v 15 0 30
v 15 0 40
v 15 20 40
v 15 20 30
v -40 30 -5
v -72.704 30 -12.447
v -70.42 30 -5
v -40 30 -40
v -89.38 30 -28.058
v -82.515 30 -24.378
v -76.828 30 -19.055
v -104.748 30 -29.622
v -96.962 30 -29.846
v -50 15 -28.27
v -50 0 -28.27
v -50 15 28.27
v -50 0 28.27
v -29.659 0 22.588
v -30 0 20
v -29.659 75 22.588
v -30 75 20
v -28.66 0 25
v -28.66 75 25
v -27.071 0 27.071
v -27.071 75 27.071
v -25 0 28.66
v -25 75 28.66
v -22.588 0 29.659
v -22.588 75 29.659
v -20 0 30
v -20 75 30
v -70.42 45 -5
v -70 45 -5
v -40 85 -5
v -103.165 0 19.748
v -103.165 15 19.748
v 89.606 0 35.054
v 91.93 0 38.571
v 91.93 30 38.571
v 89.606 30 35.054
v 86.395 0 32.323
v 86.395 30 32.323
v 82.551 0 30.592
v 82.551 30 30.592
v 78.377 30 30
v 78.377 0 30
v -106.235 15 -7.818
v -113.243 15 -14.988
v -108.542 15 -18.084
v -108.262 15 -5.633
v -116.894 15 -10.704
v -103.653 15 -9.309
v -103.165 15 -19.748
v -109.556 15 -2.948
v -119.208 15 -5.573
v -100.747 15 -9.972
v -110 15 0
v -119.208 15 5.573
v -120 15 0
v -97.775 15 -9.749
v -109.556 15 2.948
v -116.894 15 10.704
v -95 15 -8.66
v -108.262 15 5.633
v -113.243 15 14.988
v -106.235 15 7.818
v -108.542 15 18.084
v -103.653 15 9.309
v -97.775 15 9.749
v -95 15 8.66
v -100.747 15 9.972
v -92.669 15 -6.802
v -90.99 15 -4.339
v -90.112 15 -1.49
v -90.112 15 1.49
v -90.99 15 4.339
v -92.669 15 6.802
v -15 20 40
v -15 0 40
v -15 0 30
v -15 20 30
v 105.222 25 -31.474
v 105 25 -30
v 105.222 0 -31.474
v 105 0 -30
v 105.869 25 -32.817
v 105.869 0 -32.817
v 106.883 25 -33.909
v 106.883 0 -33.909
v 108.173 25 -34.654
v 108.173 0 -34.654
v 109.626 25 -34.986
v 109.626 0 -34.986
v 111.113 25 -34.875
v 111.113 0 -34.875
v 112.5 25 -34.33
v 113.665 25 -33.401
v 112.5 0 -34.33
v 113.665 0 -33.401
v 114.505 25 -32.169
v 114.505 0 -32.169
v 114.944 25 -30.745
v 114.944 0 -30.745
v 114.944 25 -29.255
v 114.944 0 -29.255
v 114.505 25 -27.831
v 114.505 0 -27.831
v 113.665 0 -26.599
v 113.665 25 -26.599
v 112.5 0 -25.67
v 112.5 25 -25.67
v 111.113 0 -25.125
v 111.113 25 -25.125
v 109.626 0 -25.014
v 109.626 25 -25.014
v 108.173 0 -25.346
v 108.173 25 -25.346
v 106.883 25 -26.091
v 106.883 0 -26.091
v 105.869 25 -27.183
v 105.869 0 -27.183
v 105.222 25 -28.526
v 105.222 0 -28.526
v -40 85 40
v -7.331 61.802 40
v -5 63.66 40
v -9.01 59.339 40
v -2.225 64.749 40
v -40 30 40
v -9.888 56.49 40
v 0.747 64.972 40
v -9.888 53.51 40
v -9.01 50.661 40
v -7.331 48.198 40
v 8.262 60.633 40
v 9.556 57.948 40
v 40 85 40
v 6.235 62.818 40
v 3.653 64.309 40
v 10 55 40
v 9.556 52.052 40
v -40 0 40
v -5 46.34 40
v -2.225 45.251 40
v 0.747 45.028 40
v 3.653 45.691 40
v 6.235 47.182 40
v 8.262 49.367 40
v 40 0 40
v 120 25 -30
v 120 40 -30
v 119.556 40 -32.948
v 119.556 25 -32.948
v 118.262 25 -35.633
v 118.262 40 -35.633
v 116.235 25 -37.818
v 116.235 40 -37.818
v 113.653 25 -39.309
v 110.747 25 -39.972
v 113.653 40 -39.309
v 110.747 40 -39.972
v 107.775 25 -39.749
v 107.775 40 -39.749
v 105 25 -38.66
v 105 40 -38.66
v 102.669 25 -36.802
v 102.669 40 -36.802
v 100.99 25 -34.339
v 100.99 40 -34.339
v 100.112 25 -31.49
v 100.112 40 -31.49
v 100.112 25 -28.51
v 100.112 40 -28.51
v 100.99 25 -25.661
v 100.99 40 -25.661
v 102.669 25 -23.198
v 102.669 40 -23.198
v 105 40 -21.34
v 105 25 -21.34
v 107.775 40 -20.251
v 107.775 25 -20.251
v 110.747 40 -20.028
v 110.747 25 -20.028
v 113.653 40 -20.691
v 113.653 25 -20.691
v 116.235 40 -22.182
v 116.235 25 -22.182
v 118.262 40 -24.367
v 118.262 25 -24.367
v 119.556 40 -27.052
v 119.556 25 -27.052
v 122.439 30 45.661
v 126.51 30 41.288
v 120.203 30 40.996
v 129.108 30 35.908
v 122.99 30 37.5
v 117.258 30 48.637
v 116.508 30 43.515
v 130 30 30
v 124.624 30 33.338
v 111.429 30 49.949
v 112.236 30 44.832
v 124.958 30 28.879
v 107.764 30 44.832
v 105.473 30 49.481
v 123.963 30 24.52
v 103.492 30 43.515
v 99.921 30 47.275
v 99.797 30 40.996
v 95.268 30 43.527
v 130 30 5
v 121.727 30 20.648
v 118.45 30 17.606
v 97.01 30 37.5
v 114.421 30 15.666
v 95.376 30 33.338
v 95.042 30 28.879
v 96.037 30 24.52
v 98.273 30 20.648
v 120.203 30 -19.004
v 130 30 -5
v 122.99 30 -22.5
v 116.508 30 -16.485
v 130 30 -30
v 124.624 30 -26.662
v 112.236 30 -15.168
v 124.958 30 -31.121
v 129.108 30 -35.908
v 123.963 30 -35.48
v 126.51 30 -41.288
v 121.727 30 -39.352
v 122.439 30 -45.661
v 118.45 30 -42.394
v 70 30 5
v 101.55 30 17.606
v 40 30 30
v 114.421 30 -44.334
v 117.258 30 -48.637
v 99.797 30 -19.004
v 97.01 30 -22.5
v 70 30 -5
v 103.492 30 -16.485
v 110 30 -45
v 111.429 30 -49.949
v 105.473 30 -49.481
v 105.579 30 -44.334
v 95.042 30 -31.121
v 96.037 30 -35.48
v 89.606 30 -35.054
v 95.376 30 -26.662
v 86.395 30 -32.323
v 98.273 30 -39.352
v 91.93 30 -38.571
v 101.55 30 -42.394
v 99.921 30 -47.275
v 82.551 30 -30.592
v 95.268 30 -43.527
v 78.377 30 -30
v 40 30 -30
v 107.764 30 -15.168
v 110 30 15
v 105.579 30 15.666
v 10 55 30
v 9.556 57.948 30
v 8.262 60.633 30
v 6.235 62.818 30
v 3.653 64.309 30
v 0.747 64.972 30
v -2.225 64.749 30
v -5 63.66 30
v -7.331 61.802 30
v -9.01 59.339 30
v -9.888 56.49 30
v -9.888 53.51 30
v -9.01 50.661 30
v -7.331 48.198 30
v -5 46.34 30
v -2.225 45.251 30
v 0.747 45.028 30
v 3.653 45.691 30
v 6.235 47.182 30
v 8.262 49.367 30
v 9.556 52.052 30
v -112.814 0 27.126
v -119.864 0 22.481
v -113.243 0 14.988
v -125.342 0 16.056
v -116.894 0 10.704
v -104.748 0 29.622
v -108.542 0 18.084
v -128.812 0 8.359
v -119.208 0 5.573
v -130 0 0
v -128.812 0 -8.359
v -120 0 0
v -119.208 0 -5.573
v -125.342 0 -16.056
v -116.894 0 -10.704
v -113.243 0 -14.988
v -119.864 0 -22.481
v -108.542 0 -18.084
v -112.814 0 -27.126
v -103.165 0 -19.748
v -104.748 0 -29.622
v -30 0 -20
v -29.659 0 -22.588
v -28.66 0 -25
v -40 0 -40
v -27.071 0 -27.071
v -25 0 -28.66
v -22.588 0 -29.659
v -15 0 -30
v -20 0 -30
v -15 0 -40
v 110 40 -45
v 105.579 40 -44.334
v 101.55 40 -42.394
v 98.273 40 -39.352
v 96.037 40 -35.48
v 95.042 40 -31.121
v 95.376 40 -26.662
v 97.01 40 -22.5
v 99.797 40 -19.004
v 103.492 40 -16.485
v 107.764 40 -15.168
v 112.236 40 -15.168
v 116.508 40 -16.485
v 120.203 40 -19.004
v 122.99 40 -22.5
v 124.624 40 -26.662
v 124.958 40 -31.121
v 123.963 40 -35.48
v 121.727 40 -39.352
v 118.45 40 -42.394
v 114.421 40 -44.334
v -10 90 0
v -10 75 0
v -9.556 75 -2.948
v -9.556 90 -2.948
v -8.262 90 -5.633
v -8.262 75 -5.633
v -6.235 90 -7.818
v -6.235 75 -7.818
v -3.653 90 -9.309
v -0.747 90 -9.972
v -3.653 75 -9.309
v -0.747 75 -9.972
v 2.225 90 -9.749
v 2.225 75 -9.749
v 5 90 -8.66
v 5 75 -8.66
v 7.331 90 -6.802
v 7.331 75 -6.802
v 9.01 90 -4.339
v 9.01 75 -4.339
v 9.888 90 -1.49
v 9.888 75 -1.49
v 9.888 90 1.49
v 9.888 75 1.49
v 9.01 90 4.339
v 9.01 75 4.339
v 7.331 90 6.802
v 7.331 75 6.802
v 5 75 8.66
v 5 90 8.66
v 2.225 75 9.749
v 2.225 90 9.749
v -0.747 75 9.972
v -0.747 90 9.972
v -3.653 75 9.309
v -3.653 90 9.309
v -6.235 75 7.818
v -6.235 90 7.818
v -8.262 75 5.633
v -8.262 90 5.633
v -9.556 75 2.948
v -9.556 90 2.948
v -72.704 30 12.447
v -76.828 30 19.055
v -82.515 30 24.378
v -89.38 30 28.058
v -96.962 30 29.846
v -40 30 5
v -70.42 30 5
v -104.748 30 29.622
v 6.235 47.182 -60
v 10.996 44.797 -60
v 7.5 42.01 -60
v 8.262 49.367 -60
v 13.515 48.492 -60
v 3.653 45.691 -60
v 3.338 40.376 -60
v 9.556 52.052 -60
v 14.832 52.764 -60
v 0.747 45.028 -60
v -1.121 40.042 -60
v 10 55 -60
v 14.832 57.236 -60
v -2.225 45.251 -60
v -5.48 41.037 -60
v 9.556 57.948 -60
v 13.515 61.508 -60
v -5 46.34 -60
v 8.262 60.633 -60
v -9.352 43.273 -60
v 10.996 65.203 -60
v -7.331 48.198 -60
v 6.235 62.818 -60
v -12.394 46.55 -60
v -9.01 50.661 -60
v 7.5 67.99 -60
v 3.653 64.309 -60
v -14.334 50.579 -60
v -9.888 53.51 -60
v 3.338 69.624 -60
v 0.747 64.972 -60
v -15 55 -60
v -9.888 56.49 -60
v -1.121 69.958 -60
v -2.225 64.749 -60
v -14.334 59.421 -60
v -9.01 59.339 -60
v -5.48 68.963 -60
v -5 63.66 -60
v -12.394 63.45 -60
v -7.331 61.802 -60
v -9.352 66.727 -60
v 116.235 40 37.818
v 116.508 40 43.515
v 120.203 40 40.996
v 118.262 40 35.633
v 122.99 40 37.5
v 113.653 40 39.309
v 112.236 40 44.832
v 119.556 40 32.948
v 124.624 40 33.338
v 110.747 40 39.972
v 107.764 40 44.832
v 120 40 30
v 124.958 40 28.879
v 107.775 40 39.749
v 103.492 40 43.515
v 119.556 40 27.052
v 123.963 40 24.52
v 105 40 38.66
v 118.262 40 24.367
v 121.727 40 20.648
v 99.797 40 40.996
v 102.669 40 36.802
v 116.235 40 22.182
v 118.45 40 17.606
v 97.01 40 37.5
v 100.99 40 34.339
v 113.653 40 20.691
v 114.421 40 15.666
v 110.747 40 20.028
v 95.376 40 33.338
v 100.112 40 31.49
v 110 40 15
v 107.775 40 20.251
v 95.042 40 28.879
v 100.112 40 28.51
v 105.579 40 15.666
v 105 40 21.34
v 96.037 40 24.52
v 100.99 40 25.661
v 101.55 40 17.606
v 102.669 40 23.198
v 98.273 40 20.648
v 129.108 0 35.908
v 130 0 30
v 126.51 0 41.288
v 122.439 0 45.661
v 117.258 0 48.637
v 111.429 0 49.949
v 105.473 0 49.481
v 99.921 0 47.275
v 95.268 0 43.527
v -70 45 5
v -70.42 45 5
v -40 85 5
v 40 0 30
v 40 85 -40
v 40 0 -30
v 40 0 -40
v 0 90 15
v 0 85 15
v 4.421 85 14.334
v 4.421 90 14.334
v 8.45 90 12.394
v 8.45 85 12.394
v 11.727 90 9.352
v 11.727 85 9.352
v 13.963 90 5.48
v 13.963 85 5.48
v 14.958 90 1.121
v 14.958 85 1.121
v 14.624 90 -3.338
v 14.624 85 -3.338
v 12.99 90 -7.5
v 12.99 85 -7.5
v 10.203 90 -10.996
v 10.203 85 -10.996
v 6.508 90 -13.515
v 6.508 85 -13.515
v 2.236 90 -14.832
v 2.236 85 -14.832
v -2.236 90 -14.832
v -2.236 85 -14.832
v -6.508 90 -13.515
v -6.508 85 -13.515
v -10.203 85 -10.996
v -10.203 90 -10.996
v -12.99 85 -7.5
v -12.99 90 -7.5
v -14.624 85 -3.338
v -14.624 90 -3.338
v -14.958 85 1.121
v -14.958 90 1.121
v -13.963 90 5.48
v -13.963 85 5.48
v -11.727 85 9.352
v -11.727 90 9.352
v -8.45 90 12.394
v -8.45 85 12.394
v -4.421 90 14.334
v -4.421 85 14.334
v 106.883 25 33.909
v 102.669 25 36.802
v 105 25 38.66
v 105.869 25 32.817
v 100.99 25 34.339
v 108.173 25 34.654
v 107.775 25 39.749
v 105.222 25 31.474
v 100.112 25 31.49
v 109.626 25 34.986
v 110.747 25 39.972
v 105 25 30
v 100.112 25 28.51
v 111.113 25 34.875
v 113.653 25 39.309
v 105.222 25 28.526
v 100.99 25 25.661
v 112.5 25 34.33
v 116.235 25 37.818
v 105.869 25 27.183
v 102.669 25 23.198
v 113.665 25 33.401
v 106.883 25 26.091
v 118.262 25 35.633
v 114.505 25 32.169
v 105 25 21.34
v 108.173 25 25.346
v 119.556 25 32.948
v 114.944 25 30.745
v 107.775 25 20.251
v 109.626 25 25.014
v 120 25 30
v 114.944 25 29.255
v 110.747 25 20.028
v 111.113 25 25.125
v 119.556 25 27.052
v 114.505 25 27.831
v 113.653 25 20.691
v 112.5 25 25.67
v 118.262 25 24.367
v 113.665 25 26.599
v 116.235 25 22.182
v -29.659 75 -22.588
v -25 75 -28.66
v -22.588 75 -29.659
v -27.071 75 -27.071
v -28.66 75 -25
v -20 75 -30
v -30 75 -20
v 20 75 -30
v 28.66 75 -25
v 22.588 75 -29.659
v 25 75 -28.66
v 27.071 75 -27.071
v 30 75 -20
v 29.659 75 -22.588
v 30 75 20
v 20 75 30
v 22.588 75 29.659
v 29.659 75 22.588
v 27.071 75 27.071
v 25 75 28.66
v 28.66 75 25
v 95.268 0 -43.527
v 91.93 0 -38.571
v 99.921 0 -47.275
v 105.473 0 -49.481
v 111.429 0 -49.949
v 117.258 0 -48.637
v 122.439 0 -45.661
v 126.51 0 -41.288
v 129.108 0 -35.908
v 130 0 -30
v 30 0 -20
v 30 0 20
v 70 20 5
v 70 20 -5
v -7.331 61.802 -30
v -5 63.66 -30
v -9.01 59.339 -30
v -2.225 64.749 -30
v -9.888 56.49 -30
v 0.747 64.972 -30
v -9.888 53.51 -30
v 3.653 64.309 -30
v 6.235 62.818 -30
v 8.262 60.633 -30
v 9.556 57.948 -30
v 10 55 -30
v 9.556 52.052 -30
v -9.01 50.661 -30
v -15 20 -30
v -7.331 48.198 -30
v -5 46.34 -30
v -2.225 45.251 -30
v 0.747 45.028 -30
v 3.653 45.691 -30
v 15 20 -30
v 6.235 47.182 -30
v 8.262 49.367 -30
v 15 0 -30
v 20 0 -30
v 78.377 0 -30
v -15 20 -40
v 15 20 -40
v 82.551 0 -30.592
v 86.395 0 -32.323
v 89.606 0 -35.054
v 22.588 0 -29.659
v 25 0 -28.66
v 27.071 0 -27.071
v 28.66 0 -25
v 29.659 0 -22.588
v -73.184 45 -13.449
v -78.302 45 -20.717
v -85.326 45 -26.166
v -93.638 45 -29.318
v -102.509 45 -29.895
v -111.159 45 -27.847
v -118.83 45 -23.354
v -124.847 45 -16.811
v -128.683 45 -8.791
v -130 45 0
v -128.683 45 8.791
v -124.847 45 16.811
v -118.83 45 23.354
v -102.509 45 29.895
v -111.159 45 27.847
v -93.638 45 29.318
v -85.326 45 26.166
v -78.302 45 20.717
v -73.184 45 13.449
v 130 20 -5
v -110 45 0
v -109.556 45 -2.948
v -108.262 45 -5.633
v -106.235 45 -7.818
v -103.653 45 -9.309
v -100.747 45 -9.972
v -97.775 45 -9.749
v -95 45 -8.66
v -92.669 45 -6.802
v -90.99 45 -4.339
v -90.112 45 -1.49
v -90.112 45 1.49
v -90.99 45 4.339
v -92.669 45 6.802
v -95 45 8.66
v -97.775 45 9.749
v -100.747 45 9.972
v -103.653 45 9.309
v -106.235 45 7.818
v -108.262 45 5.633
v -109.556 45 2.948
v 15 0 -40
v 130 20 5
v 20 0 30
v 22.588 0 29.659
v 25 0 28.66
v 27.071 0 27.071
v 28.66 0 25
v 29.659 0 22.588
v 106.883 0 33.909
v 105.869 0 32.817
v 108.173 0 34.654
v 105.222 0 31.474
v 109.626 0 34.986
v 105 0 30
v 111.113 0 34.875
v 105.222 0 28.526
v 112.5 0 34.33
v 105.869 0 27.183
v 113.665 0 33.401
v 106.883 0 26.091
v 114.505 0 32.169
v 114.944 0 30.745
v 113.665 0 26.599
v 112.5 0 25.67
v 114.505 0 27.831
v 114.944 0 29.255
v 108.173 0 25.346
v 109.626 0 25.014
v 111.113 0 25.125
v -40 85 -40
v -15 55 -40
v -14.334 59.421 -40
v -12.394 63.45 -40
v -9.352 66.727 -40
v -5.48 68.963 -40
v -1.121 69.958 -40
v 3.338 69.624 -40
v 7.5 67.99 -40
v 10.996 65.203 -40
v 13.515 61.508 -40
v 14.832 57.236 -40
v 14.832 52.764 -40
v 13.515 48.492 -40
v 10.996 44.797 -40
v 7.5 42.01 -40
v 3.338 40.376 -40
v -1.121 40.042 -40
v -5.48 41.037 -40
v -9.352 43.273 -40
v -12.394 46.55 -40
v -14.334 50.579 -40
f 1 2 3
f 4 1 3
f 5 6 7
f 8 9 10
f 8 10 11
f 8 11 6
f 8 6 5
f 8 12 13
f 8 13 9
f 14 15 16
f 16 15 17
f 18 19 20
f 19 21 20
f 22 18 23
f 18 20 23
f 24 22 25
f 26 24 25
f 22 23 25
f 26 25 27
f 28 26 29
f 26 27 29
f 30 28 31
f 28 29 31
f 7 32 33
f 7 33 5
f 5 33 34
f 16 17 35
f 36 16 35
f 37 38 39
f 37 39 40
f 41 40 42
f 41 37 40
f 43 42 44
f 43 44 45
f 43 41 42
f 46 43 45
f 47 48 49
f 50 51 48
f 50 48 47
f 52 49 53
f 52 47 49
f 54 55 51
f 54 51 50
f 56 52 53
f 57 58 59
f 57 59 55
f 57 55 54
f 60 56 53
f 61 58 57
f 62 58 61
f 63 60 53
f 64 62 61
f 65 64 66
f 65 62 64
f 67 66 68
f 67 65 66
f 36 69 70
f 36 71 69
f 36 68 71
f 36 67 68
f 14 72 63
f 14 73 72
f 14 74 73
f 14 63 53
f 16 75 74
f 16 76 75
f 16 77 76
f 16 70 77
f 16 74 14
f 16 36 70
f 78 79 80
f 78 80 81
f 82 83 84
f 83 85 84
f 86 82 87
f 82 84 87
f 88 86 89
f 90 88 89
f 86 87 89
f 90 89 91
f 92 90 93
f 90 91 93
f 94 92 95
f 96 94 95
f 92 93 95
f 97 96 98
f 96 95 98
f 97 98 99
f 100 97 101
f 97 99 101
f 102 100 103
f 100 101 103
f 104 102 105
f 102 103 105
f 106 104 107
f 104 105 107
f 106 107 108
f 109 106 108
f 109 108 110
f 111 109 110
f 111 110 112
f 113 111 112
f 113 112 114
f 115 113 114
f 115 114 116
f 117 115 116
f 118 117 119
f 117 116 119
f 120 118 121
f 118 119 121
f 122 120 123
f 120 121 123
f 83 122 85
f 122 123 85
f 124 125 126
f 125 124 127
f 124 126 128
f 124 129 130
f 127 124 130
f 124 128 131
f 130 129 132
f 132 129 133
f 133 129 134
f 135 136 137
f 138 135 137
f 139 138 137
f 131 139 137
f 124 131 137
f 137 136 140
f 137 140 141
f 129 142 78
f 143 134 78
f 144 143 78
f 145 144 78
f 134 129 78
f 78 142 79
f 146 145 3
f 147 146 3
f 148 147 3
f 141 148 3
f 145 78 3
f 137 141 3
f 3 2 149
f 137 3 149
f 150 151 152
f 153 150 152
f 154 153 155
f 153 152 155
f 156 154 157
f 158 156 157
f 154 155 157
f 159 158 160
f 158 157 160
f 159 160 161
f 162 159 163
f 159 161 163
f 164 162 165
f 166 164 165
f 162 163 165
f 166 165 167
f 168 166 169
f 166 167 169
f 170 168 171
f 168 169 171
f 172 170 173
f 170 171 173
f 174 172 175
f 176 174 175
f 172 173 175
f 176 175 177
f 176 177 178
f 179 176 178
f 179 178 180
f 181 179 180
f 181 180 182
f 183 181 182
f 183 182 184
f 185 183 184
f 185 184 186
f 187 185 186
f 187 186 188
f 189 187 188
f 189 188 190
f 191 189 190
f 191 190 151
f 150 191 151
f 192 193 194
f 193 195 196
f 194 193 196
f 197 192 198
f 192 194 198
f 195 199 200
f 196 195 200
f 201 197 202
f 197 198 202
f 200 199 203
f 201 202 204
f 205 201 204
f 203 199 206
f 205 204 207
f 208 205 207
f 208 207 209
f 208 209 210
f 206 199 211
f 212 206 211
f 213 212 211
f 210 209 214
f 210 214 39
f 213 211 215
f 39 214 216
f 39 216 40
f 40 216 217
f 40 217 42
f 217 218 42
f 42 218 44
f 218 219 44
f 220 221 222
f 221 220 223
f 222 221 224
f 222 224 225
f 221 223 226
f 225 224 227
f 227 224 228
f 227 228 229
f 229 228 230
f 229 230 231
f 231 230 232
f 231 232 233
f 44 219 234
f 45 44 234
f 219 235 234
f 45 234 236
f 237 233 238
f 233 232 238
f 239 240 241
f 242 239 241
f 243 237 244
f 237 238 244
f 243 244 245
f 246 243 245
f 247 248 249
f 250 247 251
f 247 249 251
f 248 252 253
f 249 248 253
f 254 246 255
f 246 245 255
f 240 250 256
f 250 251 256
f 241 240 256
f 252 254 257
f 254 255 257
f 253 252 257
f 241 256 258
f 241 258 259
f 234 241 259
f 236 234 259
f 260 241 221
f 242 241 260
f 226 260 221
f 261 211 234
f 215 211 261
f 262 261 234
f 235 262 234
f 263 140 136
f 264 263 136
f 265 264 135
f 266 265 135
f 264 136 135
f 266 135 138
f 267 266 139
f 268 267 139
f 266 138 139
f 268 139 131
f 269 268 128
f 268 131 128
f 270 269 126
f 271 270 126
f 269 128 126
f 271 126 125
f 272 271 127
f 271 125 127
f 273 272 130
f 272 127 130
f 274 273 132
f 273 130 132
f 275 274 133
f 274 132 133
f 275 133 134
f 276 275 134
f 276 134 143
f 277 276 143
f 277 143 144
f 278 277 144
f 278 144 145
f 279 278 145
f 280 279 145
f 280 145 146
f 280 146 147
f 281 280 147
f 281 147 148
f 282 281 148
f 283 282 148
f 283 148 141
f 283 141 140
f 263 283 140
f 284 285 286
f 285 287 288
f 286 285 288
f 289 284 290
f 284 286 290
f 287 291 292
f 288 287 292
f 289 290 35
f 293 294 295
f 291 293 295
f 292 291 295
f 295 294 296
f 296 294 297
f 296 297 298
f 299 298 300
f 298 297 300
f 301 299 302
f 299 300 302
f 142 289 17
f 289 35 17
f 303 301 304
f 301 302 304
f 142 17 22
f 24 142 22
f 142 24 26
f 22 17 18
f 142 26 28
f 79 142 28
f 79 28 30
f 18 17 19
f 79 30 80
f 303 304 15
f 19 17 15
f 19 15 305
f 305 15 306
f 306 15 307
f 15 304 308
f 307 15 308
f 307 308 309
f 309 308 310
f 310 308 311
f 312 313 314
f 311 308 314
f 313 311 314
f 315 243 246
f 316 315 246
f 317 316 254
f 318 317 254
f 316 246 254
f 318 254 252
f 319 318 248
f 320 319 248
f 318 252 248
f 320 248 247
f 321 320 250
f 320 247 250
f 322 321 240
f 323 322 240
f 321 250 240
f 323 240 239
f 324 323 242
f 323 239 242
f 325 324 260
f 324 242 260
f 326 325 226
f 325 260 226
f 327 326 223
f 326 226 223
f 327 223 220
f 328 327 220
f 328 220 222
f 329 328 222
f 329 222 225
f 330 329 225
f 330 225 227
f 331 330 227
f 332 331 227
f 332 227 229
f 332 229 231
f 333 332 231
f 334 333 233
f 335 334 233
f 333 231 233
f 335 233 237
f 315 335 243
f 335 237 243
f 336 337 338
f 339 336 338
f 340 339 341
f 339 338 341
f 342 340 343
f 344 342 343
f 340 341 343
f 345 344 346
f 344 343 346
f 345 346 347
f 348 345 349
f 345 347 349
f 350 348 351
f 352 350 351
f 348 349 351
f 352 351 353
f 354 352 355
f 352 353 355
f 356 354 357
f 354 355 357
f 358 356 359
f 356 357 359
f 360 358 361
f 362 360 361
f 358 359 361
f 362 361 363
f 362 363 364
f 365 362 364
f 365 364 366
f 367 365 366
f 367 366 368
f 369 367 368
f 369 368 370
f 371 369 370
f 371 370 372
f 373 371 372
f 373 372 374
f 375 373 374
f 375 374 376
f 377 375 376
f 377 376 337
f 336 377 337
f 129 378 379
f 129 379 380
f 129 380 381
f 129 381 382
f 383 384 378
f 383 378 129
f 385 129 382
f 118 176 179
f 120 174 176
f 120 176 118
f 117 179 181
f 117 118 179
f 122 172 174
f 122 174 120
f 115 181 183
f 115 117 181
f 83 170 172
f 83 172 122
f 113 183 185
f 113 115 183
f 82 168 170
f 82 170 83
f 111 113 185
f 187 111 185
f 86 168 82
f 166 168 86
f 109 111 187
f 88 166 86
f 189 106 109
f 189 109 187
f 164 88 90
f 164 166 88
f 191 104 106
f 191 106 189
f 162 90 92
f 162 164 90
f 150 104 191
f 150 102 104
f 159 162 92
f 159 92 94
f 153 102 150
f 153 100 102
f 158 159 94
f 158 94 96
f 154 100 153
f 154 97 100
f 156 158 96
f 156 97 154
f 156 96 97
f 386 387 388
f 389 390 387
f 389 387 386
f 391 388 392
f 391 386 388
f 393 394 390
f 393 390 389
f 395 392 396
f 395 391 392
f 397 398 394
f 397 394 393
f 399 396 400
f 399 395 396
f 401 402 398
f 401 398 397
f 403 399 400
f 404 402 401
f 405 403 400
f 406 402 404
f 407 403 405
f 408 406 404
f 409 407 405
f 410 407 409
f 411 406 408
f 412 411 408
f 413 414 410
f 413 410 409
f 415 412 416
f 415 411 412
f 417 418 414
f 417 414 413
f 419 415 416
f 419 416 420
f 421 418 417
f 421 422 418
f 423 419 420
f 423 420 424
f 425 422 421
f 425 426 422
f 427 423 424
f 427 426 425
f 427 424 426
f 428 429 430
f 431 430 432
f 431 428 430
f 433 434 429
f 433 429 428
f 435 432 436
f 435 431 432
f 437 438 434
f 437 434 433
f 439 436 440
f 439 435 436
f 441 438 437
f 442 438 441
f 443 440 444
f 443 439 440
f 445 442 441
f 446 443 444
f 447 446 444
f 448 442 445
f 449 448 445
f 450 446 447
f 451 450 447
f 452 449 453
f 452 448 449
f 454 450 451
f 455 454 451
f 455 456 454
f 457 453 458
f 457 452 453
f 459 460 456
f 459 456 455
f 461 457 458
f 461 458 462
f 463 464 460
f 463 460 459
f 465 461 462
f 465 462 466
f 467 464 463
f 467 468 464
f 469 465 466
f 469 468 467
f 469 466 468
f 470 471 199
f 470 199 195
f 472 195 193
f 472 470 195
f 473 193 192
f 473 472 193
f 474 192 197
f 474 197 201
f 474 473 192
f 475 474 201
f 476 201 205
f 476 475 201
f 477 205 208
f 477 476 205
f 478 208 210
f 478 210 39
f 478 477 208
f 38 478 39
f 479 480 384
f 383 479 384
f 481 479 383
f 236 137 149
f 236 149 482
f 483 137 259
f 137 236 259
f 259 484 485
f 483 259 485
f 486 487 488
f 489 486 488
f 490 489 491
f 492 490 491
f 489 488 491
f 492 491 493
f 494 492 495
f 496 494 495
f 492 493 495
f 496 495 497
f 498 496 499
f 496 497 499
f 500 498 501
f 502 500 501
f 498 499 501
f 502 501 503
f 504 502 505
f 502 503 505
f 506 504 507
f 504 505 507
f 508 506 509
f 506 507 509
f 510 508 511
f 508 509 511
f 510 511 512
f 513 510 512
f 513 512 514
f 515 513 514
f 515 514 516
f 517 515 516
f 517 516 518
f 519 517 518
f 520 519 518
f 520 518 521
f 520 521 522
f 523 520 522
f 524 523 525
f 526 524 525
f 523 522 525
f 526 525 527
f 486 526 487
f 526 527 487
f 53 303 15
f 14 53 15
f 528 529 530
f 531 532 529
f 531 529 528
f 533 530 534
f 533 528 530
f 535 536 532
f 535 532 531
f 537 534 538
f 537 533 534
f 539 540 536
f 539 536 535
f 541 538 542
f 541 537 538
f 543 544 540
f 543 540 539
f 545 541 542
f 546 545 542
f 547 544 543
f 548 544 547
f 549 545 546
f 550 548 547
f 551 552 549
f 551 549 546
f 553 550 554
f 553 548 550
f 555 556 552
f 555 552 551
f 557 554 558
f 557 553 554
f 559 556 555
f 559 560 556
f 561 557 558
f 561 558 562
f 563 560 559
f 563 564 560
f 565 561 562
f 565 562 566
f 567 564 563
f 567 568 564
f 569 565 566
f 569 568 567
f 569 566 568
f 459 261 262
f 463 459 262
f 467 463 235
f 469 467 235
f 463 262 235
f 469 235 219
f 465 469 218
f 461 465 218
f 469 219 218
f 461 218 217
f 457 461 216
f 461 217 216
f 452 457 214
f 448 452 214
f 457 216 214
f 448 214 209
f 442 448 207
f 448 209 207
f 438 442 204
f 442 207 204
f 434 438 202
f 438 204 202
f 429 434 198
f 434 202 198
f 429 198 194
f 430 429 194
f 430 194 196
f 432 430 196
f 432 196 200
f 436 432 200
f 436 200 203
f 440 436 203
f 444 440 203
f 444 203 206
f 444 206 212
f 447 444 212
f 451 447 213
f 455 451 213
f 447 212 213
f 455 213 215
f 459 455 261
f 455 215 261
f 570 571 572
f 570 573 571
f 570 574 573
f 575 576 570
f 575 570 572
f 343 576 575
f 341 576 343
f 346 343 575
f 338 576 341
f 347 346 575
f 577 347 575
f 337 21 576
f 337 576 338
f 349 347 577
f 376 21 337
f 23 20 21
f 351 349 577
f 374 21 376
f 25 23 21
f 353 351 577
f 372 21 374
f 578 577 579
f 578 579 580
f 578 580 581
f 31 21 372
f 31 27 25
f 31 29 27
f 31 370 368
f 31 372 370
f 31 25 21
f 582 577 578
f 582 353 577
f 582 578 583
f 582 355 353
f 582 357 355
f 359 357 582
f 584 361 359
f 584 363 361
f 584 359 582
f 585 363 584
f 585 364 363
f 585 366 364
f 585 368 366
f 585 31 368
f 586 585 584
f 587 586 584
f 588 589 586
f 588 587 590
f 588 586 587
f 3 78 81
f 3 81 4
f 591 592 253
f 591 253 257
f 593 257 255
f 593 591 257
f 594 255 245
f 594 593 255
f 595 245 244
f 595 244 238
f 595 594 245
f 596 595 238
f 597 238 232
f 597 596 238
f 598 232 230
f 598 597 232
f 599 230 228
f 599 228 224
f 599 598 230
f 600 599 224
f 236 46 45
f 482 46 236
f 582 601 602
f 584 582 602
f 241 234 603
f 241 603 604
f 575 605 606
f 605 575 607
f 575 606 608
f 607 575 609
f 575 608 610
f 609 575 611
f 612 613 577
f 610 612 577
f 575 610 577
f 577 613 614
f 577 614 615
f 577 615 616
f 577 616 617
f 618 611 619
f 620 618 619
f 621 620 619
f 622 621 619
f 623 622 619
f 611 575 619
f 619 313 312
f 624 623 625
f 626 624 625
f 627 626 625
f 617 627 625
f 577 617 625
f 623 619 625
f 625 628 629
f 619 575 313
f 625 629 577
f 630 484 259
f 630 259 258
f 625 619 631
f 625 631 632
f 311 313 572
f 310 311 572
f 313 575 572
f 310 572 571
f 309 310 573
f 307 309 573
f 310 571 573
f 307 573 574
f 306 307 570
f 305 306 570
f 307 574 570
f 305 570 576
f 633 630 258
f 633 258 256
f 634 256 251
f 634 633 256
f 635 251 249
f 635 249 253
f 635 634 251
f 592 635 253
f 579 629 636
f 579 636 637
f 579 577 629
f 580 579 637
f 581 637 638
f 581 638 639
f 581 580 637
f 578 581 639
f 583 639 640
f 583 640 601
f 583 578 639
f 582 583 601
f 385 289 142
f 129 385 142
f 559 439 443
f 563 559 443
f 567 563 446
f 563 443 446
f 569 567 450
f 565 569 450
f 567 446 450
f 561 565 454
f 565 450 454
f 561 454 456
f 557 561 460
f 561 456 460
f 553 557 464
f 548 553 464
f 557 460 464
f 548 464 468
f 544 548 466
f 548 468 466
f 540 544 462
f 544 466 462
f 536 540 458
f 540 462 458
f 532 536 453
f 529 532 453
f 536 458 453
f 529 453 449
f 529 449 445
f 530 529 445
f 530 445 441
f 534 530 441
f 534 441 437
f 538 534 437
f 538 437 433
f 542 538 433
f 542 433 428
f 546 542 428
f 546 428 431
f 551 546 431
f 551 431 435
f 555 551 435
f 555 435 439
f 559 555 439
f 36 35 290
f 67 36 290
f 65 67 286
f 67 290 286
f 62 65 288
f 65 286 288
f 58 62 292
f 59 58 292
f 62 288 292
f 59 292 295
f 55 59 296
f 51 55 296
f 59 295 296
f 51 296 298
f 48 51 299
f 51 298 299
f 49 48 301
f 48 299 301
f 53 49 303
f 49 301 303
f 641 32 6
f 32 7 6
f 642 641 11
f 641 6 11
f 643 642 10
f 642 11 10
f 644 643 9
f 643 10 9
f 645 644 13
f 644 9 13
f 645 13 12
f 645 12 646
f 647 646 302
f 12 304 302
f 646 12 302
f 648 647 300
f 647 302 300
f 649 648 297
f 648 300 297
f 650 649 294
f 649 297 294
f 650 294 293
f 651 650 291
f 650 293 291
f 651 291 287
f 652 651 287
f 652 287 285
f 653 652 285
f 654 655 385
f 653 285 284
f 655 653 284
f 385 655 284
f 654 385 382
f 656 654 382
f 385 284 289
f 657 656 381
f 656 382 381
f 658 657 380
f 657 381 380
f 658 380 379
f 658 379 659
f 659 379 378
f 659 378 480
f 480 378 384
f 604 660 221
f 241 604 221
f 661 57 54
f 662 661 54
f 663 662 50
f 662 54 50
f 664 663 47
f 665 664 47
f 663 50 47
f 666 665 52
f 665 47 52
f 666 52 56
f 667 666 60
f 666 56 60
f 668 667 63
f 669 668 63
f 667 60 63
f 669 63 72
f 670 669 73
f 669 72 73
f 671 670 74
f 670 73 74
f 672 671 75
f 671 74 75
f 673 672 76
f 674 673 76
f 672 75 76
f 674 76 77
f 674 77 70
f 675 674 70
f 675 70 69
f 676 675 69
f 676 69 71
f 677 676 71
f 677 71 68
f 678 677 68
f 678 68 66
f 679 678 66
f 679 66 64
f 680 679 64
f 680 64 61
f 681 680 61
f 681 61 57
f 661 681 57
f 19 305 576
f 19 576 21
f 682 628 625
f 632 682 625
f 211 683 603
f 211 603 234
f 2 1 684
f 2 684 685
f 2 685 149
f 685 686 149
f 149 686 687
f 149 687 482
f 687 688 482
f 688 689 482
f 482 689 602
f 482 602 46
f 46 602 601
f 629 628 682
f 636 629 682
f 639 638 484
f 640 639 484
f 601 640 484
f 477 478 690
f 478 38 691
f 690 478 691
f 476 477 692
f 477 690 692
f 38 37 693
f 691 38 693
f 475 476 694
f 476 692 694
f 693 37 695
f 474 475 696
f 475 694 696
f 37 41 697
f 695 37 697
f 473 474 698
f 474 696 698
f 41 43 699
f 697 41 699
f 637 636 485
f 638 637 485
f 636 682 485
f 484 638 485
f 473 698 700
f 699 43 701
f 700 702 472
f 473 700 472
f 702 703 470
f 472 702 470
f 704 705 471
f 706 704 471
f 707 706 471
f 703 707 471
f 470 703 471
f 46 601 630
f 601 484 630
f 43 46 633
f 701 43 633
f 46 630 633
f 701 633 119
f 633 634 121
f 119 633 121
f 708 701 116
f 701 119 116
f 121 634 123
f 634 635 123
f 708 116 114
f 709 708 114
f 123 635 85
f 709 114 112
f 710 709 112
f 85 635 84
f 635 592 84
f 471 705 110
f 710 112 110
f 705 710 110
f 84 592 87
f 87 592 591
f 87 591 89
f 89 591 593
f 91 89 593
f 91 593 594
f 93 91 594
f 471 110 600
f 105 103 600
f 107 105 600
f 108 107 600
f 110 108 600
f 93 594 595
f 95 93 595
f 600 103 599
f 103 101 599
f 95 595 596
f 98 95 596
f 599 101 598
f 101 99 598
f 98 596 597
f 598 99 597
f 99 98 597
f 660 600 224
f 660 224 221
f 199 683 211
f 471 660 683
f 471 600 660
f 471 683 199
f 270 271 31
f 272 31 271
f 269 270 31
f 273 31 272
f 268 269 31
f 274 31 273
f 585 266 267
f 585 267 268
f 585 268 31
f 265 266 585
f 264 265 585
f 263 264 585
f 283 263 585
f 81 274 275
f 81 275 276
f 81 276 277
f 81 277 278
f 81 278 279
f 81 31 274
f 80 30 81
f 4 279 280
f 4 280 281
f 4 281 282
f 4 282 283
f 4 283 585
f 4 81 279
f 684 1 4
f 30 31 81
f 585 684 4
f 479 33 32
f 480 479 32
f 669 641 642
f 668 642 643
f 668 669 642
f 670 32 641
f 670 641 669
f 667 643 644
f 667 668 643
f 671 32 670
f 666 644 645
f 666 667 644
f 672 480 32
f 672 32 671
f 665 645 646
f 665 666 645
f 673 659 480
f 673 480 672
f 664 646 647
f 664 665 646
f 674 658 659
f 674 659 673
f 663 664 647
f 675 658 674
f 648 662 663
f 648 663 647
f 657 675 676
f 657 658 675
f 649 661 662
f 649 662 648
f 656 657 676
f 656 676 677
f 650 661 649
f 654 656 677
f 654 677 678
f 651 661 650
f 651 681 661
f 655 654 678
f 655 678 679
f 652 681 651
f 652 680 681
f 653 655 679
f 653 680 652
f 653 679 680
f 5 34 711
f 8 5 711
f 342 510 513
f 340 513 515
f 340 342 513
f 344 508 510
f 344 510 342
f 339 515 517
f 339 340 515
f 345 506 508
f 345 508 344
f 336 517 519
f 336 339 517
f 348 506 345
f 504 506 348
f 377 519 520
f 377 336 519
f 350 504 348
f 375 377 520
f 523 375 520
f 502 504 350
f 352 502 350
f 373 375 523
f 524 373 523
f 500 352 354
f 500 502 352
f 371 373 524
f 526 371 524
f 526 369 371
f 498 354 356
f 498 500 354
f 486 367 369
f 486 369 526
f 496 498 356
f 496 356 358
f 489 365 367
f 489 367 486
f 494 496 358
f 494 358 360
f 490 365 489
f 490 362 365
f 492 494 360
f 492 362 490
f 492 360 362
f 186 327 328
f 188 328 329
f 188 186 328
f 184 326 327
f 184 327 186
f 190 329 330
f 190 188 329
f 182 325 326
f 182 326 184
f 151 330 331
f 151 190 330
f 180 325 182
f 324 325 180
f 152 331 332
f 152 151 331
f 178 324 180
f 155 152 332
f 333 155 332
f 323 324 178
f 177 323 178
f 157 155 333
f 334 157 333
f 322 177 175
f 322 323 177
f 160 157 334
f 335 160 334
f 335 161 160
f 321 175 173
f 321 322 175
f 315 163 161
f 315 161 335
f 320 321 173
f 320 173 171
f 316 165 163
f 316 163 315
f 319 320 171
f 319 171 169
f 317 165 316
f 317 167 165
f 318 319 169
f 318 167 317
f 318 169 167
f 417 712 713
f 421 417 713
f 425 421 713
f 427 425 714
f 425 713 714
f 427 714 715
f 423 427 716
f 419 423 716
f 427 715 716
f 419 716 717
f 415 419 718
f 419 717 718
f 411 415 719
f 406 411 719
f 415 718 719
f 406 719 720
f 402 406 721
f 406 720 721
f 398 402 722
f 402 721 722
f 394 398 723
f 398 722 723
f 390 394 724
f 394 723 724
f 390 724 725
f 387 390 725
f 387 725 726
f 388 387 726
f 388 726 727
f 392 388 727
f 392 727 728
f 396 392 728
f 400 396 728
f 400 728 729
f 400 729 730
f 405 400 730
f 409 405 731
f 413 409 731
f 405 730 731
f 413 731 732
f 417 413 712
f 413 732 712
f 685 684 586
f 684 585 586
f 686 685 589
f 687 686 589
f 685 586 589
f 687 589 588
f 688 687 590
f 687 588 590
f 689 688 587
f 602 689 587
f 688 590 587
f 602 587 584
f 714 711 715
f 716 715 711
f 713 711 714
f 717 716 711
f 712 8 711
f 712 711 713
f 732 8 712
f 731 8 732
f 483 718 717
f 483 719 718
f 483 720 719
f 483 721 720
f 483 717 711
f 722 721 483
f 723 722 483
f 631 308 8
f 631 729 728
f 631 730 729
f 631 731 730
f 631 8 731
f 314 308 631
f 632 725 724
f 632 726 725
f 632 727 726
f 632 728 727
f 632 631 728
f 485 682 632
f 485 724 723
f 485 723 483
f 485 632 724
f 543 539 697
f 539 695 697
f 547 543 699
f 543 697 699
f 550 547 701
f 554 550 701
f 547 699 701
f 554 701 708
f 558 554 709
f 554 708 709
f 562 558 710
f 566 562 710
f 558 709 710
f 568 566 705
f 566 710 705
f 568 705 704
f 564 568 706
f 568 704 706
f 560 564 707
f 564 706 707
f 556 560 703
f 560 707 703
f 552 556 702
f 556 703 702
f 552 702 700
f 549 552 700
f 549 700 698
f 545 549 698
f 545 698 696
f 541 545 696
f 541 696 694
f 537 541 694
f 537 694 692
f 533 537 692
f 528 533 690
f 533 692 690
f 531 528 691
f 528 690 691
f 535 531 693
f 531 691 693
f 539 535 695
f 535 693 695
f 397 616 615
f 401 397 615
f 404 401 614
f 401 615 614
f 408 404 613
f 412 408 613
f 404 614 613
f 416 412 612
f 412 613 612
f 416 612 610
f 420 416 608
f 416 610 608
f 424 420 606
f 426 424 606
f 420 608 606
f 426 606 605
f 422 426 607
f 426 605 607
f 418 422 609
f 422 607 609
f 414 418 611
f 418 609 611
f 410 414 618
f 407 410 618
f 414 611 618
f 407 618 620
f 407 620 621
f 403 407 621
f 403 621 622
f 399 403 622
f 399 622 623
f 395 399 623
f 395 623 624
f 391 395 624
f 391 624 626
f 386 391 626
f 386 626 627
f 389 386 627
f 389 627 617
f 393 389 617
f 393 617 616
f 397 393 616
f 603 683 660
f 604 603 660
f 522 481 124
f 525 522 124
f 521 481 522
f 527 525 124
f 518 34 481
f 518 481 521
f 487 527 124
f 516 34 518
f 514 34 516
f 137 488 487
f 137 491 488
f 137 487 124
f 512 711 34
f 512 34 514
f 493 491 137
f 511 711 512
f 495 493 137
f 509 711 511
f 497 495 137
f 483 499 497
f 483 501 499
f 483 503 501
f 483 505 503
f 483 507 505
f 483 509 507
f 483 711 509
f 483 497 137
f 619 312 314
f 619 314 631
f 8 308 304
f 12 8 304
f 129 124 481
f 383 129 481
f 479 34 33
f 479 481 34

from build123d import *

# Parameters (mm, degrees)
SKETCH2_W                                = 80
SKETCH2_H                                = 80
BOSS_EXTRUDE1_DEPTH                      = 85
SKETCH3_W                                = 30
SKETCH3_H                                = 40
CUT_EXTRUDE1_DEPTH                       = 124.389626793
SKETCH4_R                                = 15
BOSS_EXTRUDE2_DEPTH                      = 20
SKETCH5_R                                = 15
BOSS_EXTRUDE3_DEPTH                      = 5
SKETCH7_R                                = 30
BOSS_EXTRUDE4_DEPTH                      = 45
BOSS_EXTRUDE5_DEPTH                      = 30
CUT_EXTRUDE2_DEPTH                       = 15
SKETCH11_W                               = 60
SKETCH11_H                               = 60
CUT_EXTRUDE3_DEPTH                       = 75
BOSS_EXTRUDE6_DEPTH                      = 30
SKETCH21_R                               = 15
BOSS_EXTRUDE7_DEPTH                      = 10
F_20_0_20_DIAMETER_HOLE1_D               = 20
F_20_0_20_DIAMETER_HOLE2_D               = 20
F_20_0_20_DIAMETER_HOLE3_D               = 20
CBORE_FOR_M10_HEX_HEAD_BOLT2_D           = 10
CBORE_FOR_M10_HEX_HEAD_BOLT2_CBORE_D     = 20
CBORE_FOR_M10_HEX_HEAD_BOLT2_CBORE_DEPTH = 15
BOSS_EXTRUDE9_DEPTH                      = 5
SKETCH25_W                               = 10
SKETCH25_H                               = 10
CUT_EXTRUDE4_DEPTH                       = 60
FILLET1_R                                = 10


with BuildPart() as part:
    # Sketch2 → Boss-Extrude1 (new body)
    with BuildSketch(Plane(origin=(0, 0, 0), x_dir=(1, 0, 0), z_dir=(0, 1, 0))):
        Rectangle(SKETCH2_W, SKETCH2_H)
    extrude(amount=BOSS_EXTRUDE1_DEPTH)

    # Sketch3 → Cut-Extrude1 (cut, through all)
    with BuildSketch(Plane.XY.offset(40)):
        Rectangle(SKETCH3_W, SKETCH3_H)
    extrude(amount=-CUT_EXTRUDE1_DEPTH, mode=Mode.SUBTRACT)

    # Sketch4 → Boss-Extrude2 (add)
    with BuildSketch(Plane(origin=(0, 0, -40), x_dir=(-1, 0, 0), z_dir=(0, 0, -1))):
        with Locations((0, 55)):
            Circle(SKETCH4_R)
    extrude(amount=BOSS_EXTRUDE2_DEPTH)

    # Sketch5 → Boss-Extrude3 (add)
    with BuildSketch(Plane(origin=(0, 85, 0), x_dir=(1, 0, 0), z_dir=(0, 1, 0))):
        with Locations(Location((0, 0, 0), (0, 0, 270))):
            Circle(SKETCH5_R)
    extrude(amount=BOSS_EXTRUDE3_DEPTH)



with BuildPart() as body_2:
    # Sketch7 → Boss-Extrude4 (new body)
    with BuildSketch(Plane(origin=(0, 0, 0), x_dir=(1, 0, 0), z_dir=(0, 1, 0))):
        with Locations(Location((-100, 0, 0), (0, 0, 90))):
            Circle(SKETCH7_R)
    extrude(amount=BOSS_EXTRUDE4_DEPTH)


with BuildPart() as part_1:
    add(part.part)

    add(body_2.part)  # Boss-Extrude5 merges body 2
    # Sketch9 → Boss-Extrude5 (add)
    with BuildSketch(Plane(origin=(0, 0, 0), x_dir=(1, 0, 0), z_dir=(0, 1, 0))):
        with BuildLine():
            Line((-40, 0), (-40, 40))
            Line((-40, 40), (-104.747935056, 29.621902584))
            ThreePointArc((-104.747935056, 29.621902584), (-80.53770378, 22.830221765), (-70, 0))
            Line((-70, 0), (-40, 0))
        make_face()
        with BuildLine():
            Line((-40, -40), (-40, 0))
            Line((-40, 0), (-70, 0))
            ThreePointArc((-70, 0), (-80.53770378, -22.830221765), (-104.747935056, -29.621902584))
            Line((-104.747935056, -29.621902584), (-40, -40))
        make_face()
    extrude(amount=BOSS_EXTRUDE5_DEPTH)

    # Sketch10 → Cut-Extrude2 (cut)
    with BuildSketch(Plane.XZ):
        with BuildLine():
            Line((-50, 28.269512751), (-103.165290037, 19.747935056))
            ThreePointArc((-103.165290037, 19.747935056), (-120, 0), (-103.165290037, -19.747935056))
            Line((-103.165290037, -19.747935056), (-50, -28.269512751))
            Line((-50, -28.269512751), (-50, 28.269512751))
        make_face()
    extrude(amount=-CUT_EXTRUDE2_DEPTH, mode=Mode.SUBTRACT)

    # Sketch11 → Cut-Extrude3 (cut)
    with BuildSketch(Plane.XZ):
        Rectangle(SKETCH11_W, SKETCH11_H)
    extrude(amount=-CUT_EXTRUDE3_DEPTH, mode=Mode.SUBTRACT)

    # Sketch12 → Boss-Extrude6 (add)
    with BuildSketch(Plane(origin=(0, 0, 0), x_dir=(1, 0, 0), z_dir=(0, 1, 0))):
        with BuildLine():
            Line((40, 30), (78.377223398, 30))
            ThreePointArc((78.377223398, 30), (86.395060656, 32.322686179), (91.929841942, 38.571428571))
            ThreePointArc((91.929841942, 38.571428571), (114.392996633, 49.511575554), (130, 30))
            Line((130, 30), (130, -30))
            ThreePointArc((130, -30), (114.392996633, -49.511575554), (91.929841942, -38.571428571))
            ThreePointArc((91.929841942, -38.571428571), (86.395060656, -32.322686179), (78.377223398, -30))
            Line((78.377223398, -30), (40, -30))
            Line((40, -30), (40, 30))
        make_face()
    extrude(amount=BOSS_EXTRUDE6_DEPTH)

    # Sketch21 → Boss-Extrude7 (add)
    with BuildSketch(Plane(origin=(0, 30, 0), x_dir=(1, 0, 0), z_dir=(0, 1, 0))):
        with Locations(Location((110, 30, 0), (0, 0, 90))):
            Circle(SKETCH21_R)
        with Locations(Location((110, -30, 0), (0, 0, 90))):
            Circle(SKETCH21_R)
    extrude(amount=BOSS_EXTRUDE7_DEPTH)

    # Ø20.0 (20) Diameter Hole1 (through all)
    with Locations(Plane(origin=(0, 45, 0), x_dir=(1, 0, 0), z_dir=(0, 1, 0))):
        with Locations((-100, 0)):
            Hole(F_20_0_20_DIAMETER_HOLE1_D / 2)

    # Ø20.0 (20) Diameter Hole2 (through all)
    with Locations(Plane(origin=(0, 90, 0), x_dir=(1, 0, 0), z_dir=(0, 1, 0))):
        with Locations((0, 0)):
            Hole(F_20_0_20_DIAMETER_HOLE2_D / 2)

    # Ø20.0 (20) Diameter Hole3 (through all)
    with Locations(Plane(origin=(0, 0, -60), x_dir=(-1, 0, 0), z_dir=(0, 0, -1))):
        with Locations((0, 55)):
            Hole(F_20_0_20_DIAMETER_HOLE3_D / 2)

    # CBORE for M10 Hex Head Bolt2 (through all)
    with Locations(Plane(origin=(0, 40, 0), x_dir=(1, 0, 0), z_dir=(0, 1, 0))):
        with Locations((110, 30), (110, -30)):
            CounterBoreHole(CBORE_FOR_M10_HEX_HEAD_BOLT2_D / 2, CBORE_FOR_M10_HEX_HEAD_BOLT2_CBORE_D / 2, CBORE_FOR_M10_HEX_HEAD_BOLT2_CBORE_DEPTH)

    # Sketch24 → Boss-Extrude9 (add, symmetric)
    with BuildSketch(Plane.XY):
        Polygon((-40, 85), (-70, 45), (-71.999098595, 45), (-71.999098595, 30), (-70, 30), (-40, 30), align=None)
    extrude(amount=BOSS_EXTRUDE9_DEPTH, both=True)

    # Sketch25 → Cut-Extrude4 (cut)
    with BuildSketch(Plane(origin=(130, 0, 0), x_dir=(0, 0, -1), z_dir=(1, 0, 0))):
        with Locations((0, 25)):
            Rectangle(SKETCH25_W, SKETCH25_H)
    extrude(amount=-CUT_EXTRUDE4_DEPTH, mode=Mode.SUBTRACT)

    # Fillet1
    fillet1_edges = [part_1.edges().sort_by_distance(p)[0] for p in [
        (-30, 37.5, 30),
        (30, 37.5, -30),
        (-30, 37.5, -30),
        (30, 37.5, 30),
    ]]
    fillet(fillet1_edges, radius=FILLET1_R)


solid = part_1.part
